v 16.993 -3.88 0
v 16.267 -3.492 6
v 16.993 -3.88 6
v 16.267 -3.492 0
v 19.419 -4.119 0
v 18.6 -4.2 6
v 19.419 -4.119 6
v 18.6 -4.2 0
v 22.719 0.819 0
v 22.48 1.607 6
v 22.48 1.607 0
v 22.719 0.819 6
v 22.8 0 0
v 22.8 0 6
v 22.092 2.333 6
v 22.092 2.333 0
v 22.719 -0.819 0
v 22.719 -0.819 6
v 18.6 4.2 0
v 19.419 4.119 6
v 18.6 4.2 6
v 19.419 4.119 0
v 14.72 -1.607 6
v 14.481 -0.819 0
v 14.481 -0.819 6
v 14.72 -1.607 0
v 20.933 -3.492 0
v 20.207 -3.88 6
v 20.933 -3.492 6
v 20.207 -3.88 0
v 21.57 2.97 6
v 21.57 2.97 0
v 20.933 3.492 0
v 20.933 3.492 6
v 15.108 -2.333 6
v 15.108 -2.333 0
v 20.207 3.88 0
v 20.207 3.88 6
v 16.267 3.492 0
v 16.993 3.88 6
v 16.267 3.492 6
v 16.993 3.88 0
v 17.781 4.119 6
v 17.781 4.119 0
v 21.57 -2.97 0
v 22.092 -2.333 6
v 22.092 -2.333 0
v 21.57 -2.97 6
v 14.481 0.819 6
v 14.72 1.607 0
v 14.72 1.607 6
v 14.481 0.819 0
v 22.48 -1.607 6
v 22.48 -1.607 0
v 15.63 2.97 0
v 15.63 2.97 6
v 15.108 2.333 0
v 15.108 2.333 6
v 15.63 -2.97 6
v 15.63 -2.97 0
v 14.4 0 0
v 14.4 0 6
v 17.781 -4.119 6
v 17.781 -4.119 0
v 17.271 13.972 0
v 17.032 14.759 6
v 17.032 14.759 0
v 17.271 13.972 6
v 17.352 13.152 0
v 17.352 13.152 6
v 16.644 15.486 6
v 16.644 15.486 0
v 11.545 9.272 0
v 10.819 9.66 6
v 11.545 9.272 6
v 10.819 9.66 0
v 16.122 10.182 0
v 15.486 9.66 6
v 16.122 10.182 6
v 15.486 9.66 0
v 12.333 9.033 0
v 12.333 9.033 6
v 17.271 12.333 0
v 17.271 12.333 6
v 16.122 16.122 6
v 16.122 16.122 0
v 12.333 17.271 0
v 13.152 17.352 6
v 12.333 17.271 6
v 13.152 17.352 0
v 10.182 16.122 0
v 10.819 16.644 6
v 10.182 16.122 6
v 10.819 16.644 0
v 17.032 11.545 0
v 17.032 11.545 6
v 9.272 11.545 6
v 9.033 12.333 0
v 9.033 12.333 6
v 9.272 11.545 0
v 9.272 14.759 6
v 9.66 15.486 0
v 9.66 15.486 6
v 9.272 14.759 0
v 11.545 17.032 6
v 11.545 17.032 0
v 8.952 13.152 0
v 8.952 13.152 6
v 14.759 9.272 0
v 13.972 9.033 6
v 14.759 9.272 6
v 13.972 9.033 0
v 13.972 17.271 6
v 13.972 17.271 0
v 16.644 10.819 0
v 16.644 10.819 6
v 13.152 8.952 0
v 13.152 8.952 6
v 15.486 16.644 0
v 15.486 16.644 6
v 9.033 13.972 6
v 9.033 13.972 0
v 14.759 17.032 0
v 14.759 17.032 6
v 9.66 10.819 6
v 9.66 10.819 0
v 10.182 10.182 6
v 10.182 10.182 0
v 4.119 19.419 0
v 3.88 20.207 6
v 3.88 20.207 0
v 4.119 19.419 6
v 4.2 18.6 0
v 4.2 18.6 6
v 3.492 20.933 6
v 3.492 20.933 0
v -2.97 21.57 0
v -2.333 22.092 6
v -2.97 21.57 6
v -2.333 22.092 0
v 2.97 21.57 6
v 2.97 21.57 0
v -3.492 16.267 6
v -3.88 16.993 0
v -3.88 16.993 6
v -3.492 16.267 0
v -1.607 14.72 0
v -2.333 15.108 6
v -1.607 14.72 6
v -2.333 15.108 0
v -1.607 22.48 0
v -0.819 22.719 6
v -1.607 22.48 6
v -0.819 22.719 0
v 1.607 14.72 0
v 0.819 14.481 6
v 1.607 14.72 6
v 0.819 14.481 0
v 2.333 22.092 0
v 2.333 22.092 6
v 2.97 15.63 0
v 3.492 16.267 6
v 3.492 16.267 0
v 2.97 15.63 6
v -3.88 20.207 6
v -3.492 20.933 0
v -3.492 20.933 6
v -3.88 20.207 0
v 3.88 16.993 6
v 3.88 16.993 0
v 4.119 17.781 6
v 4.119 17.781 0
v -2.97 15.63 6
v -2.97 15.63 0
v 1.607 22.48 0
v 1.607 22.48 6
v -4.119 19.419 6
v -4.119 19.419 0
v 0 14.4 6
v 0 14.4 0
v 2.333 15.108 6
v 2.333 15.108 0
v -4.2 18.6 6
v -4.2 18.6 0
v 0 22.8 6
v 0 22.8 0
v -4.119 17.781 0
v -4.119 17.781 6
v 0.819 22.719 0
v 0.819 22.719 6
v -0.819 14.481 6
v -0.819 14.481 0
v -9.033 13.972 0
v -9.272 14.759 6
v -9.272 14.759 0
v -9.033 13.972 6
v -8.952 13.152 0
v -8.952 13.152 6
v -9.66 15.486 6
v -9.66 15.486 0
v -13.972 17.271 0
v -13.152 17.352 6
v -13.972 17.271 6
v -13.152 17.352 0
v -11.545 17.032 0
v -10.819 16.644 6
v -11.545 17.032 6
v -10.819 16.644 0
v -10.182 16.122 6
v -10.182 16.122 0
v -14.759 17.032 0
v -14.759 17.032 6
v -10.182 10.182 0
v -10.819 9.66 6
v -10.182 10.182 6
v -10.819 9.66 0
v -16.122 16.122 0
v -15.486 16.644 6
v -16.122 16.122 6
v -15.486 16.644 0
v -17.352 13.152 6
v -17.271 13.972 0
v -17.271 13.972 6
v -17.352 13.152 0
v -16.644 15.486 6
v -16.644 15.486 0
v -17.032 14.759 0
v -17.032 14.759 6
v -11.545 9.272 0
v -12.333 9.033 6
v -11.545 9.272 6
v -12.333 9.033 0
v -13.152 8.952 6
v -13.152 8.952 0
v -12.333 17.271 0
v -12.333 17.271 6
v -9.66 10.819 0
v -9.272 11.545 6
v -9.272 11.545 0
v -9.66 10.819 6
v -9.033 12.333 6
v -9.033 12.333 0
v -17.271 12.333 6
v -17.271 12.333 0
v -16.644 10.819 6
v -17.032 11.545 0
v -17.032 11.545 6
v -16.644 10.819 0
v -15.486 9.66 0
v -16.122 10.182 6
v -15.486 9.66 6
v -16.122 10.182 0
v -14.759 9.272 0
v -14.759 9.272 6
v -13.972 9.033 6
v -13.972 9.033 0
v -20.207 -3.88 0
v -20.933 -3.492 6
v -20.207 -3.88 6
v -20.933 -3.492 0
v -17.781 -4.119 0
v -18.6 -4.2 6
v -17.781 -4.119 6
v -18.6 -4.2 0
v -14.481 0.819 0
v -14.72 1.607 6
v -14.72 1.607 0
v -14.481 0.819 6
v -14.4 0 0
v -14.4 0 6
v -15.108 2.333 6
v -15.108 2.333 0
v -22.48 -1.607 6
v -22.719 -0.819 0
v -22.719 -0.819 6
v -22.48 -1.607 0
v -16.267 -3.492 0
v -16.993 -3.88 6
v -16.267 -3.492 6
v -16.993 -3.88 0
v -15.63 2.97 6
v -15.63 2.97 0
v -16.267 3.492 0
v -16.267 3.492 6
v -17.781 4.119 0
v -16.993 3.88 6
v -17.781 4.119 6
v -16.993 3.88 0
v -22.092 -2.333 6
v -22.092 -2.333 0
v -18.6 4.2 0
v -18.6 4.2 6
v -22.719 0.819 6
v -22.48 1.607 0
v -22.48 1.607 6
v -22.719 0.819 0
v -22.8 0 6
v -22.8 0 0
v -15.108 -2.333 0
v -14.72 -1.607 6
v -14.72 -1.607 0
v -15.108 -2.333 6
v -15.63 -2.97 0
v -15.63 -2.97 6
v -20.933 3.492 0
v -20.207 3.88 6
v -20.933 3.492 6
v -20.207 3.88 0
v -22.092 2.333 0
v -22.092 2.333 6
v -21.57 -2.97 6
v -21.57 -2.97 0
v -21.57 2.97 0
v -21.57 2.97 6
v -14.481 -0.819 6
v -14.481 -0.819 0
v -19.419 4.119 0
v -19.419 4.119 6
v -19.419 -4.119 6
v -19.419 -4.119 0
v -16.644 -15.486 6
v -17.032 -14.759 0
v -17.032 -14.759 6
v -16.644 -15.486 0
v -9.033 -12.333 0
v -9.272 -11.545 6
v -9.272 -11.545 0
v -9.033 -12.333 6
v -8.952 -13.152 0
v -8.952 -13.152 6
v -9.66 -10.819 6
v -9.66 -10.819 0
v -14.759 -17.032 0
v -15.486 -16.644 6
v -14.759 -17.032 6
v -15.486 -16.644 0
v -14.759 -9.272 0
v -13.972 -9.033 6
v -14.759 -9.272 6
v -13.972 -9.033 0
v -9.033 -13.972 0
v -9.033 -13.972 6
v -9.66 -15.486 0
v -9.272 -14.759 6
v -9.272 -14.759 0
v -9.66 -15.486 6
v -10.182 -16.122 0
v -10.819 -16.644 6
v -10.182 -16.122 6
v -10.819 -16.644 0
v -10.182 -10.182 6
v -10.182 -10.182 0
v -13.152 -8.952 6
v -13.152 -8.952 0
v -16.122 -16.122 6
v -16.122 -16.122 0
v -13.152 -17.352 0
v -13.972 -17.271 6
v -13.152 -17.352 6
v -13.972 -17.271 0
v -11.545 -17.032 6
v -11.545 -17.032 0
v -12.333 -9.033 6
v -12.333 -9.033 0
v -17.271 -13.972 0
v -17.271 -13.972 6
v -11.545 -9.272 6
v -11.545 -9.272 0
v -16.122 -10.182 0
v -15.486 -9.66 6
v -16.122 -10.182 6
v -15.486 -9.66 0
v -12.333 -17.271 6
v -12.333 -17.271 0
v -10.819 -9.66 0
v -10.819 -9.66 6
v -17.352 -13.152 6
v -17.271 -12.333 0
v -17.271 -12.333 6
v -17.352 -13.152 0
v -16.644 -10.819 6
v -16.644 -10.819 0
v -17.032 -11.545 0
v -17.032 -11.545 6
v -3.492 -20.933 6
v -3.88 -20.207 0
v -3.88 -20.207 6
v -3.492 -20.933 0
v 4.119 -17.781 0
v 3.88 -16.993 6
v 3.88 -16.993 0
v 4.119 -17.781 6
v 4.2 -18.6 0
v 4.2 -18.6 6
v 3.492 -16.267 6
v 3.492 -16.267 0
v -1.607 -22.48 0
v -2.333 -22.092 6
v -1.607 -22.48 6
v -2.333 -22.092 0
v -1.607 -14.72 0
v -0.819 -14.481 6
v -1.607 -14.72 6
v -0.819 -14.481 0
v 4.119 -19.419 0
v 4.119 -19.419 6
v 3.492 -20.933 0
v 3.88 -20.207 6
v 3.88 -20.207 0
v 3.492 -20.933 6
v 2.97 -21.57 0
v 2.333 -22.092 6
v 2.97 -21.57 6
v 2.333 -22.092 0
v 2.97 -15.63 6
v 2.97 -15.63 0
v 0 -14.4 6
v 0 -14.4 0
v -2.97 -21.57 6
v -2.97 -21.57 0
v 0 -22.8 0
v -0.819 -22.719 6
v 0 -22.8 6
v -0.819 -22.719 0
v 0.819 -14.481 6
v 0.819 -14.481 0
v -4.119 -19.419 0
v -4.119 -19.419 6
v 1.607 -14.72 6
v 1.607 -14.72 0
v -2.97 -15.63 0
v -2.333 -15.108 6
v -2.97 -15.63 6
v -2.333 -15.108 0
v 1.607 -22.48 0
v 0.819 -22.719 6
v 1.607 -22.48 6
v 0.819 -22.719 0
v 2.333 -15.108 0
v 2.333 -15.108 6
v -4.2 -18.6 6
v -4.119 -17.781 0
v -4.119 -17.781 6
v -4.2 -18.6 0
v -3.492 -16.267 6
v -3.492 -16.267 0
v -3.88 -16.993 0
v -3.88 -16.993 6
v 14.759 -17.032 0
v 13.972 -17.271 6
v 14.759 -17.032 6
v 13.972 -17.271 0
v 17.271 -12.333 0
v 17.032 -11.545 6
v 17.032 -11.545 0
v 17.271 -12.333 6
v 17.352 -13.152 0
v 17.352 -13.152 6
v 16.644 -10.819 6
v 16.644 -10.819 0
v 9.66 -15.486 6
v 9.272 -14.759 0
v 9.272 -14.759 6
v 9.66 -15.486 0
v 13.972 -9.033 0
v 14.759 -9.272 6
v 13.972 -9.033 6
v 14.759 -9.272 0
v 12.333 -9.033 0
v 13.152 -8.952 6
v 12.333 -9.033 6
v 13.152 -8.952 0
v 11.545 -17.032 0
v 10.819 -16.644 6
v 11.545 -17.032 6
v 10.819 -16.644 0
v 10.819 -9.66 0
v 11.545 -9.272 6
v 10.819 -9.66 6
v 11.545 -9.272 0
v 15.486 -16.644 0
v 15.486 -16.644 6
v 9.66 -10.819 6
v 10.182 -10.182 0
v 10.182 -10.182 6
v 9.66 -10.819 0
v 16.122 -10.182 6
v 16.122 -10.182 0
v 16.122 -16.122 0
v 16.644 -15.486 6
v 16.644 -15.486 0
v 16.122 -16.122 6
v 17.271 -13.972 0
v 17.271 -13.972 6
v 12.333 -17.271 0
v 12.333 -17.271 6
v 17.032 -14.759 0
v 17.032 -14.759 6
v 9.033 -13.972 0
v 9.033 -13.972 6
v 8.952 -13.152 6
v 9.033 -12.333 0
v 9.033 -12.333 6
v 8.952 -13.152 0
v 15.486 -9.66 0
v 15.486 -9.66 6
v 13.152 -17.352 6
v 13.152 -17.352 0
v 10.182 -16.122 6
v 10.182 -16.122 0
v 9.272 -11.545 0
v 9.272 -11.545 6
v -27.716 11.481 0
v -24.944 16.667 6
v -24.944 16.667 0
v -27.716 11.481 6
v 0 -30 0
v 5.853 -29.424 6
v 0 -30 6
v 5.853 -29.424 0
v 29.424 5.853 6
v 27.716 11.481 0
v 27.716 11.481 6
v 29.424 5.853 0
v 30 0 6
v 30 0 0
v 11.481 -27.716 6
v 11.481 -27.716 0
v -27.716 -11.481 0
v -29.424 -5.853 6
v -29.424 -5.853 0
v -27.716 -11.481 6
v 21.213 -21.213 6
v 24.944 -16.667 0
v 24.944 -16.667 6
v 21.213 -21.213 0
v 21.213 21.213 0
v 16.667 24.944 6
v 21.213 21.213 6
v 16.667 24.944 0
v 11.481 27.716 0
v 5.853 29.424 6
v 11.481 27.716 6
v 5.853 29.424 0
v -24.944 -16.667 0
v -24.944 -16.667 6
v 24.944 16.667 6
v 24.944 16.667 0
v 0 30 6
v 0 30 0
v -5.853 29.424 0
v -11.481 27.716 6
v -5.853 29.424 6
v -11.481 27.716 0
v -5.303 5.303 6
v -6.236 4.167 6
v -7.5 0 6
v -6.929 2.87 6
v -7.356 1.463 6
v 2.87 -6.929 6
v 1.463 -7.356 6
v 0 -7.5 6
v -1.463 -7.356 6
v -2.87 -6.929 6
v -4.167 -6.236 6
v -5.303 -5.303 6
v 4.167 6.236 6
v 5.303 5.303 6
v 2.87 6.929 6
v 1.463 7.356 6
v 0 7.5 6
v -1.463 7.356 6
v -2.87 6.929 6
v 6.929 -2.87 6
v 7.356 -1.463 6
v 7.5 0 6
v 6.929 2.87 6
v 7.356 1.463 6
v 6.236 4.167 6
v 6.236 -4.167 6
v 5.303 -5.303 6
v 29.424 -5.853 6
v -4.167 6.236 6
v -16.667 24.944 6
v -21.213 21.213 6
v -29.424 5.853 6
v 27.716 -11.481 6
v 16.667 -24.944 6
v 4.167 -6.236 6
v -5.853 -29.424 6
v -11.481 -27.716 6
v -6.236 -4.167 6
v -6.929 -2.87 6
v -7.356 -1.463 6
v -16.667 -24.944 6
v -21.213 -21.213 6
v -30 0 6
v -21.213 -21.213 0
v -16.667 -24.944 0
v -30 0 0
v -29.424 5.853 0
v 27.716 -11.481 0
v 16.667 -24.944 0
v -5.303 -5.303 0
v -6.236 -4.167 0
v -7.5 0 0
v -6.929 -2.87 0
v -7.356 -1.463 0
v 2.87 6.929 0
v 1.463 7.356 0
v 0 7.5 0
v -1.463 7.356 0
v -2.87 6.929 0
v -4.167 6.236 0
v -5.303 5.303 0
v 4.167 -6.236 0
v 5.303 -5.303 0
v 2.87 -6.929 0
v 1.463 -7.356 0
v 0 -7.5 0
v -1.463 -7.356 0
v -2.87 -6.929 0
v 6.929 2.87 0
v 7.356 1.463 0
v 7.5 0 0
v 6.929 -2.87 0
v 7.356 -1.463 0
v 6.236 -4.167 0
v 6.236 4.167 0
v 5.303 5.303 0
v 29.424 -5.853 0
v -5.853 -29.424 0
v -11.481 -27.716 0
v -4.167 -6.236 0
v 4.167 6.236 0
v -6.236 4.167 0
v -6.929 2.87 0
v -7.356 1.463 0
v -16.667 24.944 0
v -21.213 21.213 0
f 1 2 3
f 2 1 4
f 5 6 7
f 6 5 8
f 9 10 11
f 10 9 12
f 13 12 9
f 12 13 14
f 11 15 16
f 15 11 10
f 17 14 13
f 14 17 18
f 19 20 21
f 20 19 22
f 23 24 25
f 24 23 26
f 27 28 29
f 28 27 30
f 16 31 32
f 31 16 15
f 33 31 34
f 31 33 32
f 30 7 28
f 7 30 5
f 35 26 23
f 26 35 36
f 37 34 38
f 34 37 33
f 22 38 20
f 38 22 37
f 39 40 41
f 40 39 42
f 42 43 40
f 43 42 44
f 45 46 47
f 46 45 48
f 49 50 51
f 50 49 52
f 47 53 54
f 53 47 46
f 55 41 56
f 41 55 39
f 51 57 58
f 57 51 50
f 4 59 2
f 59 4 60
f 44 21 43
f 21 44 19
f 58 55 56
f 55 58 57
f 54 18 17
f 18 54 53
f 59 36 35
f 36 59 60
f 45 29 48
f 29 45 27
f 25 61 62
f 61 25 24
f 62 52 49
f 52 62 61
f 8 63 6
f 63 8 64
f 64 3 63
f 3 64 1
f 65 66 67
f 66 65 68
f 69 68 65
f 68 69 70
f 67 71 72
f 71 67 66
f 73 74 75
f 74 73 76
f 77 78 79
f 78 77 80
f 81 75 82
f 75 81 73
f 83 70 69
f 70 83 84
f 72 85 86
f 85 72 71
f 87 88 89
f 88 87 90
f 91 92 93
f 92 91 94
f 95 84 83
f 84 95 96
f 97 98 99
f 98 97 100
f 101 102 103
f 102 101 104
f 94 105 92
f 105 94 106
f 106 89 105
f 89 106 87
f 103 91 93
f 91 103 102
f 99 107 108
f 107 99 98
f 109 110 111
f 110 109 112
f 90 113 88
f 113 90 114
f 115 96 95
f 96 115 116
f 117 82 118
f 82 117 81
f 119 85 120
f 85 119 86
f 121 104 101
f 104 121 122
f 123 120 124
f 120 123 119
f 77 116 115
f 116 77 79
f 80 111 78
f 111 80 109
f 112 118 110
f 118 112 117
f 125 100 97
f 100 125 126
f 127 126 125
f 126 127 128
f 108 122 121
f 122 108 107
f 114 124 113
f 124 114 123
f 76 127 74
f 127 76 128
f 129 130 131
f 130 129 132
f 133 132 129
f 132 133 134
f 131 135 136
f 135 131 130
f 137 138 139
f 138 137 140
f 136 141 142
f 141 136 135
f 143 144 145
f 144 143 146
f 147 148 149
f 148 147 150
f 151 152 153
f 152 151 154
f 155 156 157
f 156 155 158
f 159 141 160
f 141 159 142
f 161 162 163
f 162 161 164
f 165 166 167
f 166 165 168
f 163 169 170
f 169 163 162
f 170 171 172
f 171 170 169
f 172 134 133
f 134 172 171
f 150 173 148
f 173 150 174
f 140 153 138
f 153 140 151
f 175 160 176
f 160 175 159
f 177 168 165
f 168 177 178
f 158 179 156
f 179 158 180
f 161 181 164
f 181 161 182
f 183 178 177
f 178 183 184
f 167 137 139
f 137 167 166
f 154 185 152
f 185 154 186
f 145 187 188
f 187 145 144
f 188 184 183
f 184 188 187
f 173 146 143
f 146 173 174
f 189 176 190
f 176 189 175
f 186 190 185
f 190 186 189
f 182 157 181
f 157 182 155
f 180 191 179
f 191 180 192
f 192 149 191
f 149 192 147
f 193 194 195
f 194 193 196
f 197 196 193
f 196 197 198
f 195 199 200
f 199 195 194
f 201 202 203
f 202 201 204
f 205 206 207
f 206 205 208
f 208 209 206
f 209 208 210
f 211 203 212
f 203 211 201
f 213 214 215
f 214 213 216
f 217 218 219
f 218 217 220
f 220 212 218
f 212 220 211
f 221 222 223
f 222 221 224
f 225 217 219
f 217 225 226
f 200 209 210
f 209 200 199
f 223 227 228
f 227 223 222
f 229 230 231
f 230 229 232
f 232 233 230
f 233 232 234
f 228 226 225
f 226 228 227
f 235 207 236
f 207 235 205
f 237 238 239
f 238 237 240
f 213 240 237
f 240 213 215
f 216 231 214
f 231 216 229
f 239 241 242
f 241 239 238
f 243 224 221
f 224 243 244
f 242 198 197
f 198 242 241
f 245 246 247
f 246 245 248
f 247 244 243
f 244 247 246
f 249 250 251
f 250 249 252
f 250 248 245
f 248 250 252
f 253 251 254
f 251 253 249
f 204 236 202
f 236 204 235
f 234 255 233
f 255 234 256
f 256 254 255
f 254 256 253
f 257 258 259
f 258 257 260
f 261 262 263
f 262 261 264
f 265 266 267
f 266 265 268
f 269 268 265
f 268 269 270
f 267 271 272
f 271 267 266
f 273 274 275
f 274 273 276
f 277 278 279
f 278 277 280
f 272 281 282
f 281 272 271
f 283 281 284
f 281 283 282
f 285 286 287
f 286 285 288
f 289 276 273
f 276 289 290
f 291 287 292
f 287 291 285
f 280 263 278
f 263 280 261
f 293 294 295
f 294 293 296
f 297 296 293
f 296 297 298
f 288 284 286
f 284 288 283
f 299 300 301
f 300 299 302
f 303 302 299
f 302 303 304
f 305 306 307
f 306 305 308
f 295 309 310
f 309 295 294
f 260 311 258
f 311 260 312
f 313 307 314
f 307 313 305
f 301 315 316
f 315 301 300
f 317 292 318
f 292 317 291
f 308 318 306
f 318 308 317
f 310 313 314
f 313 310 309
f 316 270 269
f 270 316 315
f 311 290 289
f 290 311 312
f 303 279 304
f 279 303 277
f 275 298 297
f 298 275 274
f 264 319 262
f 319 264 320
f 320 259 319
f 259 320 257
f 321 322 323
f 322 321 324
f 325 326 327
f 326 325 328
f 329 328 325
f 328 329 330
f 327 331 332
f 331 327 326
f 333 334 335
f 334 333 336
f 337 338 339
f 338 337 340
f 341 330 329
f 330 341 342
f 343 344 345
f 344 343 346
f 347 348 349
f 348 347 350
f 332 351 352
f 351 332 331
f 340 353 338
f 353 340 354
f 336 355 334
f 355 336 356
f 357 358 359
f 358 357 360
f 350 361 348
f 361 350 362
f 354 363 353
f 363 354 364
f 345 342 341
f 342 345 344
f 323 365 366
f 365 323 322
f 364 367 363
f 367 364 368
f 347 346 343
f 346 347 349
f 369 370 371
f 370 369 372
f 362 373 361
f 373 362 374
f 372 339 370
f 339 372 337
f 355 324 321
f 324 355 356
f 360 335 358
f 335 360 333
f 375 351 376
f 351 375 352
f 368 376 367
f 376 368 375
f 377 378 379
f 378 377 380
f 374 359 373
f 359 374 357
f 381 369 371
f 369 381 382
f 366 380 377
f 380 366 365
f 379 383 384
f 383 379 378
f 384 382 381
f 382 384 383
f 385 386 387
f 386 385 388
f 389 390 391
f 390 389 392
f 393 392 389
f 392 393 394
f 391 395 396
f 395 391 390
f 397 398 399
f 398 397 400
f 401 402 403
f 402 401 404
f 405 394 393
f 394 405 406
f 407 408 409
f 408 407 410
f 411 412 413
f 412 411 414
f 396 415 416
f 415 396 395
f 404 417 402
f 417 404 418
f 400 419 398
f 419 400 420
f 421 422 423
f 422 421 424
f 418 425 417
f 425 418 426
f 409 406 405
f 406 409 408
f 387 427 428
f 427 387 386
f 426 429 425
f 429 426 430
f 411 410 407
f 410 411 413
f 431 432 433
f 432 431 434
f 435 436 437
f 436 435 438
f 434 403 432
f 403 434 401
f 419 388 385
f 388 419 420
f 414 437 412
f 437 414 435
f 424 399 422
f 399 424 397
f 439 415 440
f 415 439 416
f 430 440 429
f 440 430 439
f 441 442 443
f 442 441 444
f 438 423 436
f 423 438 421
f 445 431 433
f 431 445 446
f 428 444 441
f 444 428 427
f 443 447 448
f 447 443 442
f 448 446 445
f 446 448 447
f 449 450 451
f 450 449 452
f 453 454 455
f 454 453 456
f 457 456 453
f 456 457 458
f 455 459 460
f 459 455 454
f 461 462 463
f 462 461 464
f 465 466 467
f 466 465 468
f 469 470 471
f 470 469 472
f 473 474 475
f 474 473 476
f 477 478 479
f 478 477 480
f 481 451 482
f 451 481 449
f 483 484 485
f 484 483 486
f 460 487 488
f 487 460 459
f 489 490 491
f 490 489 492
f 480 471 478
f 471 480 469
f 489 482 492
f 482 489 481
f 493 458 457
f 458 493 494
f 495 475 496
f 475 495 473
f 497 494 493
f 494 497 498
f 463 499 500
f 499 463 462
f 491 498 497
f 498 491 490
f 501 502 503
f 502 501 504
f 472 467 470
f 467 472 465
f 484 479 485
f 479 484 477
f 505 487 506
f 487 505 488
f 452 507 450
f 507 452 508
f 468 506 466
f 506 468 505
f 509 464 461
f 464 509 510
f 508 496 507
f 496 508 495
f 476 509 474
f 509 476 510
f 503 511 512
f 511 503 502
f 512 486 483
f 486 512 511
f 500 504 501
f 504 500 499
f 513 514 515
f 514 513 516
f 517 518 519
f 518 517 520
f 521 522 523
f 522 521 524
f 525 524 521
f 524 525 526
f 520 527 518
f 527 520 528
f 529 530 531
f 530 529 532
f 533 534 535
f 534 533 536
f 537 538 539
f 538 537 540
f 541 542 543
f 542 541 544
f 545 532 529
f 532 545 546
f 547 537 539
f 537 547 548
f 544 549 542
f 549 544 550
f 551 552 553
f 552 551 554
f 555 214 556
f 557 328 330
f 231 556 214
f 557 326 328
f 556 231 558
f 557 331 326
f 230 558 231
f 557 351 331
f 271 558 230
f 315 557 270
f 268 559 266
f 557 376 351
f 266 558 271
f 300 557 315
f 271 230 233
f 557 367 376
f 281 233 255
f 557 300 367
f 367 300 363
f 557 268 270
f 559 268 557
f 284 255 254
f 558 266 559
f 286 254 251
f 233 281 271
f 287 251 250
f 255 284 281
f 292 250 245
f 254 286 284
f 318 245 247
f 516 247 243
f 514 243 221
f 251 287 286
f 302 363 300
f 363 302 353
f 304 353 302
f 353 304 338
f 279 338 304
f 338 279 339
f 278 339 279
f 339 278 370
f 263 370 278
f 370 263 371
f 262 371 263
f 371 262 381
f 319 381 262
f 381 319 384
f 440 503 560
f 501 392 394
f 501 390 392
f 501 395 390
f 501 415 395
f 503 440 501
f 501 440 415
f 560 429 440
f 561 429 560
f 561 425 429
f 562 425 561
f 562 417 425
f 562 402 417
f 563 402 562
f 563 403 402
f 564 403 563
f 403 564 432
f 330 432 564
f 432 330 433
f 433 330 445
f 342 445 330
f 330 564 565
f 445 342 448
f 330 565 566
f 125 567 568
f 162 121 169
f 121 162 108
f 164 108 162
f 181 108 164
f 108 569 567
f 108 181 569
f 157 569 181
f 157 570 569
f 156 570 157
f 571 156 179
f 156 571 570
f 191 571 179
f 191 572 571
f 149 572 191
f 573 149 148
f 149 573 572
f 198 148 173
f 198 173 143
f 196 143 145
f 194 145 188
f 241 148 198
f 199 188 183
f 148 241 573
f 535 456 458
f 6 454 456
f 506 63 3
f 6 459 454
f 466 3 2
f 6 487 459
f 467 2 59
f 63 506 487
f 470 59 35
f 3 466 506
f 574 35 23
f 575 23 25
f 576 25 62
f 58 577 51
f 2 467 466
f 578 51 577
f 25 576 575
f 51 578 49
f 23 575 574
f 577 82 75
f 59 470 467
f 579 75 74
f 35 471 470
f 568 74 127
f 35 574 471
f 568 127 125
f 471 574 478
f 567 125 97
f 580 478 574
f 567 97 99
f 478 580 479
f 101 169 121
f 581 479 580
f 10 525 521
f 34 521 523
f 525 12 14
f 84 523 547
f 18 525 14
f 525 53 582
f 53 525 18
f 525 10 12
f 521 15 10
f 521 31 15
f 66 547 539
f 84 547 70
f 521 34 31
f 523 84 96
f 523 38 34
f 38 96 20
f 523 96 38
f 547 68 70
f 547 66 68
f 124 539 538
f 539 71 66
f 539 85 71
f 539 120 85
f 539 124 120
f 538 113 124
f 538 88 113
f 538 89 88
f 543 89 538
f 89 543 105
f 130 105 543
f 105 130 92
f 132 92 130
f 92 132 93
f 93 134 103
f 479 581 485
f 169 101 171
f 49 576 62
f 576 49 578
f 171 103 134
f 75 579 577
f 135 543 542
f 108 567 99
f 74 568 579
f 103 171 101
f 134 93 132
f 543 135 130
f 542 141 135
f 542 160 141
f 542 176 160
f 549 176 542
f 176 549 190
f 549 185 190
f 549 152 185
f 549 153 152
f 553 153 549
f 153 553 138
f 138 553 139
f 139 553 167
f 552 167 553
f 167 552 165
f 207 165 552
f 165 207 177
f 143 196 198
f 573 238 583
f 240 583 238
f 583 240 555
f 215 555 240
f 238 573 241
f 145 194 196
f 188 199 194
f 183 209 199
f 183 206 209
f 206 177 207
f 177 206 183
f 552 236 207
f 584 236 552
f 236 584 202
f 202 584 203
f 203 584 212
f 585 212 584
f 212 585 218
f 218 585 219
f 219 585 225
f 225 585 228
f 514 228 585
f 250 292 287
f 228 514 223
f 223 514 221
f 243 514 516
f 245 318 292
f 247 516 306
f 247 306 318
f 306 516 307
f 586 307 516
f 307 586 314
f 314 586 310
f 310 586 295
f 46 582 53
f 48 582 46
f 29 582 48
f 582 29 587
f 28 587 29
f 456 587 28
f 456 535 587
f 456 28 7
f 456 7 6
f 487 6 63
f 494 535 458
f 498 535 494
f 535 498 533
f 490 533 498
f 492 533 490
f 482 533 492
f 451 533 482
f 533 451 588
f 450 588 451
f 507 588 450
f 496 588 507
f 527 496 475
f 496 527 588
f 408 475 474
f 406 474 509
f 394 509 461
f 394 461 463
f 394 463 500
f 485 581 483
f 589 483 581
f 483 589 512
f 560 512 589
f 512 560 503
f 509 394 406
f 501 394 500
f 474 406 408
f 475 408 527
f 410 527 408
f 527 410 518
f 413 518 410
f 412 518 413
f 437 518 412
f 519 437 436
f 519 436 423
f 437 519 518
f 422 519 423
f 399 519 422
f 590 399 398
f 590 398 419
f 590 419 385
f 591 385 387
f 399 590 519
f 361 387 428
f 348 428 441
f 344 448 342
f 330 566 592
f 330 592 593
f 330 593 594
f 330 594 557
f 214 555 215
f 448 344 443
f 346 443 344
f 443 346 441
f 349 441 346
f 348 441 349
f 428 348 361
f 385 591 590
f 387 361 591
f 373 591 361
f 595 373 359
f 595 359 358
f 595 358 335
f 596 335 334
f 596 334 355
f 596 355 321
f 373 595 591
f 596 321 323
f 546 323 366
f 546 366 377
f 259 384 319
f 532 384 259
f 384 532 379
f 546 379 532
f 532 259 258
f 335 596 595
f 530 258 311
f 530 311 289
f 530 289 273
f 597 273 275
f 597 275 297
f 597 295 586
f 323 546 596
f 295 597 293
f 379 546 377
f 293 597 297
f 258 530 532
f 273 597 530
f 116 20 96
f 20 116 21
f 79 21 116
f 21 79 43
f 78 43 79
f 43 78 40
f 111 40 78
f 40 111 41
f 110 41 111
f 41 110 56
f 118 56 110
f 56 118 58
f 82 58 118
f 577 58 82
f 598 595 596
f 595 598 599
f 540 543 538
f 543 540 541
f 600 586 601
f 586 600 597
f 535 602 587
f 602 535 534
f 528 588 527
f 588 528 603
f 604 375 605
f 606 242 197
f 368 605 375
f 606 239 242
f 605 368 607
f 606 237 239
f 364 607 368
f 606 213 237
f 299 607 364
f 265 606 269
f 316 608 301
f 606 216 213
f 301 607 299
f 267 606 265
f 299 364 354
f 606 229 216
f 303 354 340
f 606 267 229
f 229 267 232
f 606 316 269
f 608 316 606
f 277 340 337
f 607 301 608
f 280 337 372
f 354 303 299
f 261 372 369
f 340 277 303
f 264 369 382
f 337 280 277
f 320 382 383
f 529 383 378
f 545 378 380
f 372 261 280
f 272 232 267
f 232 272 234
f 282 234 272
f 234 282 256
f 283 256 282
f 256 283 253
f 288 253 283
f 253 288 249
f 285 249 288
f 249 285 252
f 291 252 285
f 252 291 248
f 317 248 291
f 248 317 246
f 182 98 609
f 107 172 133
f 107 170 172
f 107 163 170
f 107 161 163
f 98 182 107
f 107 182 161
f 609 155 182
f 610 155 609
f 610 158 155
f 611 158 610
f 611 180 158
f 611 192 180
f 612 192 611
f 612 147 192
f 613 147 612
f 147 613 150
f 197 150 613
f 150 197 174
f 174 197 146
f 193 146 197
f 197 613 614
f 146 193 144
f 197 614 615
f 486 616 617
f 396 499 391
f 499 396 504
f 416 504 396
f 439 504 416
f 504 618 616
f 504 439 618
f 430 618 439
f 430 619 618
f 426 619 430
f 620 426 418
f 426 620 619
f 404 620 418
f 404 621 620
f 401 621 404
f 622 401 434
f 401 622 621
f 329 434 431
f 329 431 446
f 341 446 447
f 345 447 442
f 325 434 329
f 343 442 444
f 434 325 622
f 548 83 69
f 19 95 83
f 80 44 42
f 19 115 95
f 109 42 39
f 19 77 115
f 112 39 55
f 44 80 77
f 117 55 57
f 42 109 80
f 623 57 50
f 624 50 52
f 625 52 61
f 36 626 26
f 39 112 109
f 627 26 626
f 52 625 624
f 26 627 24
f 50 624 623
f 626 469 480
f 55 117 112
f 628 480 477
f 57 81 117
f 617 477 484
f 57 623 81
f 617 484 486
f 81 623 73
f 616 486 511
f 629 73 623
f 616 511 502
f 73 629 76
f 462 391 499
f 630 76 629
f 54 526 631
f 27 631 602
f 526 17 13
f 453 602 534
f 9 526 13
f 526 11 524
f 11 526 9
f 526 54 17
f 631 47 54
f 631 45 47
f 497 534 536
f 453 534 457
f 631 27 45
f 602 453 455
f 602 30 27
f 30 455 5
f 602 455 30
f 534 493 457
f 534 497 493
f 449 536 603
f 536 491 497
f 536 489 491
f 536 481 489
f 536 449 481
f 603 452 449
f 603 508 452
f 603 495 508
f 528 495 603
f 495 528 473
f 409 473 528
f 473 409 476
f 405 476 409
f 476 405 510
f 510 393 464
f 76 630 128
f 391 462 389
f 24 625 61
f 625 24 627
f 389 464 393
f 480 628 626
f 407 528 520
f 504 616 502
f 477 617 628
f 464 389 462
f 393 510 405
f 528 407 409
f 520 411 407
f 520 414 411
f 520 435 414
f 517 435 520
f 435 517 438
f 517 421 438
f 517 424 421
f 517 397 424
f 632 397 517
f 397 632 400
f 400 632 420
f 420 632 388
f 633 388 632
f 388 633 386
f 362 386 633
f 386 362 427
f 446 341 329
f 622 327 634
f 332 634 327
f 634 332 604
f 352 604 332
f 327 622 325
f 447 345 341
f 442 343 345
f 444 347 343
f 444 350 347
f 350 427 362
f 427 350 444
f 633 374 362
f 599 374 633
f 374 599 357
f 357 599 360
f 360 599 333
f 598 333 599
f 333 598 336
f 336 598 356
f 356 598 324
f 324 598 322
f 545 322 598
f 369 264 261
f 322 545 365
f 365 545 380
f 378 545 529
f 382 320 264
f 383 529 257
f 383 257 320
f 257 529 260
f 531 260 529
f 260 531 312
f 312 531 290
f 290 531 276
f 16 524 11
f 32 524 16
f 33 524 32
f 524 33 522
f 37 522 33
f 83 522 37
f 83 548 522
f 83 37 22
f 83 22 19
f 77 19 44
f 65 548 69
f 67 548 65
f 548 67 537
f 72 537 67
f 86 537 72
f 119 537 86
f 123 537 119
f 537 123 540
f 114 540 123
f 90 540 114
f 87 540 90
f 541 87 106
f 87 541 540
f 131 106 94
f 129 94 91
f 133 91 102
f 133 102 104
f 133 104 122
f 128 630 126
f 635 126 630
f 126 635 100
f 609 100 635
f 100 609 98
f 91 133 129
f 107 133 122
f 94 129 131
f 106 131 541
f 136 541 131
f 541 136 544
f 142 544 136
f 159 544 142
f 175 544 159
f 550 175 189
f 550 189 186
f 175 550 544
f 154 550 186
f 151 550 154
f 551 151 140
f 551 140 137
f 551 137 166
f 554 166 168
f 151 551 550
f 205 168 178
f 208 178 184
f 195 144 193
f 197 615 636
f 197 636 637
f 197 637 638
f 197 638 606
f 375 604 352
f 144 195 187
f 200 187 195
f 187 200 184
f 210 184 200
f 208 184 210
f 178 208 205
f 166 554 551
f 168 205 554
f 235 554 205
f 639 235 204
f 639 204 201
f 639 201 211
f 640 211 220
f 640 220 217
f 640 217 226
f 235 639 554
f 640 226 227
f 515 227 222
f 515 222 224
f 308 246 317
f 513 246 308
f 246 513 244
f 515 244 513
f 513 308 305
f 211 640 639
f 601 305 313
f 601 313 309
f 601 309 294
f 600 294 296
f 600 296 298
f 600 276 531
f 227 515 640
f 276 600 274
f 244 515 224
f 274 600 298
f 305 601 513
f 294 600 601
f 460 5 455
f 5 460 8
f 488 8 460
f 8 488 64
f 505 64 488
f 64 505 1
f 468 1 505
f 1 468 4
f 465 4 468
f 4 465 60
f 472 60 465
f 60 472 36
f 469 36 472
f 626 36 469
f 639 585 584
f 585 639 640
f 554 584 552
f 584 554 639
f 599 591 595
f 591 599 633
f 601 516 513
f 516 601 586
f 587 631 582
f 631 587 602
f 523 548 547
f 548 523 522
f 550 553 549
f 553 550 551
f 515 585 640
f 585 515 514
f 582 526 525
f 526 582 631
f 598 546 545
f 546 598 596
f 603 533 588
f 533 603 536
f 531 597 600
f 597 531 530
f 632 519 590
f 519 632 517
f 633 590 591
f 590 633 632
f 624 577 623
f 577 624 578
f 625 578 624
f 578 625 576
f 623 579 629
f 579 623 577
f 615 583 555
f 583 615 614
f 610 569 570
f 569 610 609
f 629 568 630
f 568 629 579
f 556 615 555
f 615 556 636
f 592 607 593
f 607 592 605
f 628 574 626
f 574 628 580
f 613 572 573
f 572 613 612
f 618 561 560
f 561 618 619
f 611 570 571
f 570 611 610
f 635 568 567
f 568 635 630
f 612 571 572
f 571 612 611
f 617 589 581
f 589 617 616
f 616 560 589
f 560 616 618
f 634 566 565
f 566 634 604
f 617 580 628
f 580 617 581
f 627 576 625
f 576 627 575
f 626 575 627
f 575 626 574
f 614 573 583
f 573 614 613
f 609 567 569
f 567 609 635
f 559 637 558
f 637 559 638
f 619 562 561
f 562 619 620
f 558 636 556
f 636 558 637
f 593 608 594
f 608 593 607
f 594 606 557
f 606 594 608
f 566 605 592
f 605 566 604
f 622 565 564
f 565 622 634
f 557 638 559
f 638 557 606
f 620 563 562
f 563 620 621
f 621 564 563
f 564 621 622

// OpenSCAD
$fn = 32;

// ----------------------------------------------------------------------
// Flange Ø60 x 6
// 8 holes on a Ø37.2 bolt circle, bolted joints
// ----------------------------------------------------------------------

// --- parameters (mm) ---
flange_d = 60;   // outside diameter of the flange
seat_tol = 0.1;  // tolerance at the seating features
free_tol = 0.5;  // general tolerance on the free sizes
thickness = 6;   // flange thickness
holes = 8;       // number of bolt holes
pcd = 37.2;      // bolt circle diameter
start_deg = 0;   // angle of the first hole, from +X
hole_d = 8.4;    // bolt hole diameter
bore_d = 15;     // central through bore
hub_d = 23;      // hub outside diameter
hub_h = 0;       // hub height above the flange face (0 = no hub)

// --- derived feature positions (mm) ---
height = thickness + hub_h;  // = 6   overall height of the part
pcd_r = pcd / 2;             // = 18.6   bolt circle radius
hole_step = 360 / holes;     // = 45   angular pitch
feature_centers = [
  [pcd_r * cos(start_deg + 0 * hole_step), pcd_r * sin(start_deg + 0 * hole_step)],
  [pcd_r * cos(start_deg + 1 * hole_step), pcd_r * sin(start_deg + 1 * hole_step)],
  [pcd_r * cos(start_deg + 2 * hole_step), pcd_r * sin(start_deg + 2 * hole_step)],
  [pcd_r * cos(start_deg + 3 * hole_step), pcd_r * sin(start_deg + 3 * hole_step)],
  [pcd_r * cos(start_deg + 4 * hole_step), pcd_r * sin(start_deg + 4 * hole_step)],
  [pcd_r * cos(start_deg + 5 * hole_step), pcd_r * sin(start_deg + 5 * hole_step)],
  [pcd_r * cos(start_deg + 6 * hole_step), pcd_r * sin(start_deg + 6 * hole_step)],
  [pcd_r * cos(start_deg + 7 * hole_step), pcd_r * sin(start_deg + 7 * hole_step)]
];   // bolt hole centres on the pitch circle

// flange disc, every hole and the bore cut straight through
difference() {
  union() {
    cylinder(d = flange_d, h = thickness);
  }
  translate([0, 0, -1]) cylinder(d = bore_d, h = height + 2);  // bore, through
  for (centre = feature_centers)
    translate([centre[0], centre[1], -1]) cylinder(d = hole_d, h = thickness + 2);
}
